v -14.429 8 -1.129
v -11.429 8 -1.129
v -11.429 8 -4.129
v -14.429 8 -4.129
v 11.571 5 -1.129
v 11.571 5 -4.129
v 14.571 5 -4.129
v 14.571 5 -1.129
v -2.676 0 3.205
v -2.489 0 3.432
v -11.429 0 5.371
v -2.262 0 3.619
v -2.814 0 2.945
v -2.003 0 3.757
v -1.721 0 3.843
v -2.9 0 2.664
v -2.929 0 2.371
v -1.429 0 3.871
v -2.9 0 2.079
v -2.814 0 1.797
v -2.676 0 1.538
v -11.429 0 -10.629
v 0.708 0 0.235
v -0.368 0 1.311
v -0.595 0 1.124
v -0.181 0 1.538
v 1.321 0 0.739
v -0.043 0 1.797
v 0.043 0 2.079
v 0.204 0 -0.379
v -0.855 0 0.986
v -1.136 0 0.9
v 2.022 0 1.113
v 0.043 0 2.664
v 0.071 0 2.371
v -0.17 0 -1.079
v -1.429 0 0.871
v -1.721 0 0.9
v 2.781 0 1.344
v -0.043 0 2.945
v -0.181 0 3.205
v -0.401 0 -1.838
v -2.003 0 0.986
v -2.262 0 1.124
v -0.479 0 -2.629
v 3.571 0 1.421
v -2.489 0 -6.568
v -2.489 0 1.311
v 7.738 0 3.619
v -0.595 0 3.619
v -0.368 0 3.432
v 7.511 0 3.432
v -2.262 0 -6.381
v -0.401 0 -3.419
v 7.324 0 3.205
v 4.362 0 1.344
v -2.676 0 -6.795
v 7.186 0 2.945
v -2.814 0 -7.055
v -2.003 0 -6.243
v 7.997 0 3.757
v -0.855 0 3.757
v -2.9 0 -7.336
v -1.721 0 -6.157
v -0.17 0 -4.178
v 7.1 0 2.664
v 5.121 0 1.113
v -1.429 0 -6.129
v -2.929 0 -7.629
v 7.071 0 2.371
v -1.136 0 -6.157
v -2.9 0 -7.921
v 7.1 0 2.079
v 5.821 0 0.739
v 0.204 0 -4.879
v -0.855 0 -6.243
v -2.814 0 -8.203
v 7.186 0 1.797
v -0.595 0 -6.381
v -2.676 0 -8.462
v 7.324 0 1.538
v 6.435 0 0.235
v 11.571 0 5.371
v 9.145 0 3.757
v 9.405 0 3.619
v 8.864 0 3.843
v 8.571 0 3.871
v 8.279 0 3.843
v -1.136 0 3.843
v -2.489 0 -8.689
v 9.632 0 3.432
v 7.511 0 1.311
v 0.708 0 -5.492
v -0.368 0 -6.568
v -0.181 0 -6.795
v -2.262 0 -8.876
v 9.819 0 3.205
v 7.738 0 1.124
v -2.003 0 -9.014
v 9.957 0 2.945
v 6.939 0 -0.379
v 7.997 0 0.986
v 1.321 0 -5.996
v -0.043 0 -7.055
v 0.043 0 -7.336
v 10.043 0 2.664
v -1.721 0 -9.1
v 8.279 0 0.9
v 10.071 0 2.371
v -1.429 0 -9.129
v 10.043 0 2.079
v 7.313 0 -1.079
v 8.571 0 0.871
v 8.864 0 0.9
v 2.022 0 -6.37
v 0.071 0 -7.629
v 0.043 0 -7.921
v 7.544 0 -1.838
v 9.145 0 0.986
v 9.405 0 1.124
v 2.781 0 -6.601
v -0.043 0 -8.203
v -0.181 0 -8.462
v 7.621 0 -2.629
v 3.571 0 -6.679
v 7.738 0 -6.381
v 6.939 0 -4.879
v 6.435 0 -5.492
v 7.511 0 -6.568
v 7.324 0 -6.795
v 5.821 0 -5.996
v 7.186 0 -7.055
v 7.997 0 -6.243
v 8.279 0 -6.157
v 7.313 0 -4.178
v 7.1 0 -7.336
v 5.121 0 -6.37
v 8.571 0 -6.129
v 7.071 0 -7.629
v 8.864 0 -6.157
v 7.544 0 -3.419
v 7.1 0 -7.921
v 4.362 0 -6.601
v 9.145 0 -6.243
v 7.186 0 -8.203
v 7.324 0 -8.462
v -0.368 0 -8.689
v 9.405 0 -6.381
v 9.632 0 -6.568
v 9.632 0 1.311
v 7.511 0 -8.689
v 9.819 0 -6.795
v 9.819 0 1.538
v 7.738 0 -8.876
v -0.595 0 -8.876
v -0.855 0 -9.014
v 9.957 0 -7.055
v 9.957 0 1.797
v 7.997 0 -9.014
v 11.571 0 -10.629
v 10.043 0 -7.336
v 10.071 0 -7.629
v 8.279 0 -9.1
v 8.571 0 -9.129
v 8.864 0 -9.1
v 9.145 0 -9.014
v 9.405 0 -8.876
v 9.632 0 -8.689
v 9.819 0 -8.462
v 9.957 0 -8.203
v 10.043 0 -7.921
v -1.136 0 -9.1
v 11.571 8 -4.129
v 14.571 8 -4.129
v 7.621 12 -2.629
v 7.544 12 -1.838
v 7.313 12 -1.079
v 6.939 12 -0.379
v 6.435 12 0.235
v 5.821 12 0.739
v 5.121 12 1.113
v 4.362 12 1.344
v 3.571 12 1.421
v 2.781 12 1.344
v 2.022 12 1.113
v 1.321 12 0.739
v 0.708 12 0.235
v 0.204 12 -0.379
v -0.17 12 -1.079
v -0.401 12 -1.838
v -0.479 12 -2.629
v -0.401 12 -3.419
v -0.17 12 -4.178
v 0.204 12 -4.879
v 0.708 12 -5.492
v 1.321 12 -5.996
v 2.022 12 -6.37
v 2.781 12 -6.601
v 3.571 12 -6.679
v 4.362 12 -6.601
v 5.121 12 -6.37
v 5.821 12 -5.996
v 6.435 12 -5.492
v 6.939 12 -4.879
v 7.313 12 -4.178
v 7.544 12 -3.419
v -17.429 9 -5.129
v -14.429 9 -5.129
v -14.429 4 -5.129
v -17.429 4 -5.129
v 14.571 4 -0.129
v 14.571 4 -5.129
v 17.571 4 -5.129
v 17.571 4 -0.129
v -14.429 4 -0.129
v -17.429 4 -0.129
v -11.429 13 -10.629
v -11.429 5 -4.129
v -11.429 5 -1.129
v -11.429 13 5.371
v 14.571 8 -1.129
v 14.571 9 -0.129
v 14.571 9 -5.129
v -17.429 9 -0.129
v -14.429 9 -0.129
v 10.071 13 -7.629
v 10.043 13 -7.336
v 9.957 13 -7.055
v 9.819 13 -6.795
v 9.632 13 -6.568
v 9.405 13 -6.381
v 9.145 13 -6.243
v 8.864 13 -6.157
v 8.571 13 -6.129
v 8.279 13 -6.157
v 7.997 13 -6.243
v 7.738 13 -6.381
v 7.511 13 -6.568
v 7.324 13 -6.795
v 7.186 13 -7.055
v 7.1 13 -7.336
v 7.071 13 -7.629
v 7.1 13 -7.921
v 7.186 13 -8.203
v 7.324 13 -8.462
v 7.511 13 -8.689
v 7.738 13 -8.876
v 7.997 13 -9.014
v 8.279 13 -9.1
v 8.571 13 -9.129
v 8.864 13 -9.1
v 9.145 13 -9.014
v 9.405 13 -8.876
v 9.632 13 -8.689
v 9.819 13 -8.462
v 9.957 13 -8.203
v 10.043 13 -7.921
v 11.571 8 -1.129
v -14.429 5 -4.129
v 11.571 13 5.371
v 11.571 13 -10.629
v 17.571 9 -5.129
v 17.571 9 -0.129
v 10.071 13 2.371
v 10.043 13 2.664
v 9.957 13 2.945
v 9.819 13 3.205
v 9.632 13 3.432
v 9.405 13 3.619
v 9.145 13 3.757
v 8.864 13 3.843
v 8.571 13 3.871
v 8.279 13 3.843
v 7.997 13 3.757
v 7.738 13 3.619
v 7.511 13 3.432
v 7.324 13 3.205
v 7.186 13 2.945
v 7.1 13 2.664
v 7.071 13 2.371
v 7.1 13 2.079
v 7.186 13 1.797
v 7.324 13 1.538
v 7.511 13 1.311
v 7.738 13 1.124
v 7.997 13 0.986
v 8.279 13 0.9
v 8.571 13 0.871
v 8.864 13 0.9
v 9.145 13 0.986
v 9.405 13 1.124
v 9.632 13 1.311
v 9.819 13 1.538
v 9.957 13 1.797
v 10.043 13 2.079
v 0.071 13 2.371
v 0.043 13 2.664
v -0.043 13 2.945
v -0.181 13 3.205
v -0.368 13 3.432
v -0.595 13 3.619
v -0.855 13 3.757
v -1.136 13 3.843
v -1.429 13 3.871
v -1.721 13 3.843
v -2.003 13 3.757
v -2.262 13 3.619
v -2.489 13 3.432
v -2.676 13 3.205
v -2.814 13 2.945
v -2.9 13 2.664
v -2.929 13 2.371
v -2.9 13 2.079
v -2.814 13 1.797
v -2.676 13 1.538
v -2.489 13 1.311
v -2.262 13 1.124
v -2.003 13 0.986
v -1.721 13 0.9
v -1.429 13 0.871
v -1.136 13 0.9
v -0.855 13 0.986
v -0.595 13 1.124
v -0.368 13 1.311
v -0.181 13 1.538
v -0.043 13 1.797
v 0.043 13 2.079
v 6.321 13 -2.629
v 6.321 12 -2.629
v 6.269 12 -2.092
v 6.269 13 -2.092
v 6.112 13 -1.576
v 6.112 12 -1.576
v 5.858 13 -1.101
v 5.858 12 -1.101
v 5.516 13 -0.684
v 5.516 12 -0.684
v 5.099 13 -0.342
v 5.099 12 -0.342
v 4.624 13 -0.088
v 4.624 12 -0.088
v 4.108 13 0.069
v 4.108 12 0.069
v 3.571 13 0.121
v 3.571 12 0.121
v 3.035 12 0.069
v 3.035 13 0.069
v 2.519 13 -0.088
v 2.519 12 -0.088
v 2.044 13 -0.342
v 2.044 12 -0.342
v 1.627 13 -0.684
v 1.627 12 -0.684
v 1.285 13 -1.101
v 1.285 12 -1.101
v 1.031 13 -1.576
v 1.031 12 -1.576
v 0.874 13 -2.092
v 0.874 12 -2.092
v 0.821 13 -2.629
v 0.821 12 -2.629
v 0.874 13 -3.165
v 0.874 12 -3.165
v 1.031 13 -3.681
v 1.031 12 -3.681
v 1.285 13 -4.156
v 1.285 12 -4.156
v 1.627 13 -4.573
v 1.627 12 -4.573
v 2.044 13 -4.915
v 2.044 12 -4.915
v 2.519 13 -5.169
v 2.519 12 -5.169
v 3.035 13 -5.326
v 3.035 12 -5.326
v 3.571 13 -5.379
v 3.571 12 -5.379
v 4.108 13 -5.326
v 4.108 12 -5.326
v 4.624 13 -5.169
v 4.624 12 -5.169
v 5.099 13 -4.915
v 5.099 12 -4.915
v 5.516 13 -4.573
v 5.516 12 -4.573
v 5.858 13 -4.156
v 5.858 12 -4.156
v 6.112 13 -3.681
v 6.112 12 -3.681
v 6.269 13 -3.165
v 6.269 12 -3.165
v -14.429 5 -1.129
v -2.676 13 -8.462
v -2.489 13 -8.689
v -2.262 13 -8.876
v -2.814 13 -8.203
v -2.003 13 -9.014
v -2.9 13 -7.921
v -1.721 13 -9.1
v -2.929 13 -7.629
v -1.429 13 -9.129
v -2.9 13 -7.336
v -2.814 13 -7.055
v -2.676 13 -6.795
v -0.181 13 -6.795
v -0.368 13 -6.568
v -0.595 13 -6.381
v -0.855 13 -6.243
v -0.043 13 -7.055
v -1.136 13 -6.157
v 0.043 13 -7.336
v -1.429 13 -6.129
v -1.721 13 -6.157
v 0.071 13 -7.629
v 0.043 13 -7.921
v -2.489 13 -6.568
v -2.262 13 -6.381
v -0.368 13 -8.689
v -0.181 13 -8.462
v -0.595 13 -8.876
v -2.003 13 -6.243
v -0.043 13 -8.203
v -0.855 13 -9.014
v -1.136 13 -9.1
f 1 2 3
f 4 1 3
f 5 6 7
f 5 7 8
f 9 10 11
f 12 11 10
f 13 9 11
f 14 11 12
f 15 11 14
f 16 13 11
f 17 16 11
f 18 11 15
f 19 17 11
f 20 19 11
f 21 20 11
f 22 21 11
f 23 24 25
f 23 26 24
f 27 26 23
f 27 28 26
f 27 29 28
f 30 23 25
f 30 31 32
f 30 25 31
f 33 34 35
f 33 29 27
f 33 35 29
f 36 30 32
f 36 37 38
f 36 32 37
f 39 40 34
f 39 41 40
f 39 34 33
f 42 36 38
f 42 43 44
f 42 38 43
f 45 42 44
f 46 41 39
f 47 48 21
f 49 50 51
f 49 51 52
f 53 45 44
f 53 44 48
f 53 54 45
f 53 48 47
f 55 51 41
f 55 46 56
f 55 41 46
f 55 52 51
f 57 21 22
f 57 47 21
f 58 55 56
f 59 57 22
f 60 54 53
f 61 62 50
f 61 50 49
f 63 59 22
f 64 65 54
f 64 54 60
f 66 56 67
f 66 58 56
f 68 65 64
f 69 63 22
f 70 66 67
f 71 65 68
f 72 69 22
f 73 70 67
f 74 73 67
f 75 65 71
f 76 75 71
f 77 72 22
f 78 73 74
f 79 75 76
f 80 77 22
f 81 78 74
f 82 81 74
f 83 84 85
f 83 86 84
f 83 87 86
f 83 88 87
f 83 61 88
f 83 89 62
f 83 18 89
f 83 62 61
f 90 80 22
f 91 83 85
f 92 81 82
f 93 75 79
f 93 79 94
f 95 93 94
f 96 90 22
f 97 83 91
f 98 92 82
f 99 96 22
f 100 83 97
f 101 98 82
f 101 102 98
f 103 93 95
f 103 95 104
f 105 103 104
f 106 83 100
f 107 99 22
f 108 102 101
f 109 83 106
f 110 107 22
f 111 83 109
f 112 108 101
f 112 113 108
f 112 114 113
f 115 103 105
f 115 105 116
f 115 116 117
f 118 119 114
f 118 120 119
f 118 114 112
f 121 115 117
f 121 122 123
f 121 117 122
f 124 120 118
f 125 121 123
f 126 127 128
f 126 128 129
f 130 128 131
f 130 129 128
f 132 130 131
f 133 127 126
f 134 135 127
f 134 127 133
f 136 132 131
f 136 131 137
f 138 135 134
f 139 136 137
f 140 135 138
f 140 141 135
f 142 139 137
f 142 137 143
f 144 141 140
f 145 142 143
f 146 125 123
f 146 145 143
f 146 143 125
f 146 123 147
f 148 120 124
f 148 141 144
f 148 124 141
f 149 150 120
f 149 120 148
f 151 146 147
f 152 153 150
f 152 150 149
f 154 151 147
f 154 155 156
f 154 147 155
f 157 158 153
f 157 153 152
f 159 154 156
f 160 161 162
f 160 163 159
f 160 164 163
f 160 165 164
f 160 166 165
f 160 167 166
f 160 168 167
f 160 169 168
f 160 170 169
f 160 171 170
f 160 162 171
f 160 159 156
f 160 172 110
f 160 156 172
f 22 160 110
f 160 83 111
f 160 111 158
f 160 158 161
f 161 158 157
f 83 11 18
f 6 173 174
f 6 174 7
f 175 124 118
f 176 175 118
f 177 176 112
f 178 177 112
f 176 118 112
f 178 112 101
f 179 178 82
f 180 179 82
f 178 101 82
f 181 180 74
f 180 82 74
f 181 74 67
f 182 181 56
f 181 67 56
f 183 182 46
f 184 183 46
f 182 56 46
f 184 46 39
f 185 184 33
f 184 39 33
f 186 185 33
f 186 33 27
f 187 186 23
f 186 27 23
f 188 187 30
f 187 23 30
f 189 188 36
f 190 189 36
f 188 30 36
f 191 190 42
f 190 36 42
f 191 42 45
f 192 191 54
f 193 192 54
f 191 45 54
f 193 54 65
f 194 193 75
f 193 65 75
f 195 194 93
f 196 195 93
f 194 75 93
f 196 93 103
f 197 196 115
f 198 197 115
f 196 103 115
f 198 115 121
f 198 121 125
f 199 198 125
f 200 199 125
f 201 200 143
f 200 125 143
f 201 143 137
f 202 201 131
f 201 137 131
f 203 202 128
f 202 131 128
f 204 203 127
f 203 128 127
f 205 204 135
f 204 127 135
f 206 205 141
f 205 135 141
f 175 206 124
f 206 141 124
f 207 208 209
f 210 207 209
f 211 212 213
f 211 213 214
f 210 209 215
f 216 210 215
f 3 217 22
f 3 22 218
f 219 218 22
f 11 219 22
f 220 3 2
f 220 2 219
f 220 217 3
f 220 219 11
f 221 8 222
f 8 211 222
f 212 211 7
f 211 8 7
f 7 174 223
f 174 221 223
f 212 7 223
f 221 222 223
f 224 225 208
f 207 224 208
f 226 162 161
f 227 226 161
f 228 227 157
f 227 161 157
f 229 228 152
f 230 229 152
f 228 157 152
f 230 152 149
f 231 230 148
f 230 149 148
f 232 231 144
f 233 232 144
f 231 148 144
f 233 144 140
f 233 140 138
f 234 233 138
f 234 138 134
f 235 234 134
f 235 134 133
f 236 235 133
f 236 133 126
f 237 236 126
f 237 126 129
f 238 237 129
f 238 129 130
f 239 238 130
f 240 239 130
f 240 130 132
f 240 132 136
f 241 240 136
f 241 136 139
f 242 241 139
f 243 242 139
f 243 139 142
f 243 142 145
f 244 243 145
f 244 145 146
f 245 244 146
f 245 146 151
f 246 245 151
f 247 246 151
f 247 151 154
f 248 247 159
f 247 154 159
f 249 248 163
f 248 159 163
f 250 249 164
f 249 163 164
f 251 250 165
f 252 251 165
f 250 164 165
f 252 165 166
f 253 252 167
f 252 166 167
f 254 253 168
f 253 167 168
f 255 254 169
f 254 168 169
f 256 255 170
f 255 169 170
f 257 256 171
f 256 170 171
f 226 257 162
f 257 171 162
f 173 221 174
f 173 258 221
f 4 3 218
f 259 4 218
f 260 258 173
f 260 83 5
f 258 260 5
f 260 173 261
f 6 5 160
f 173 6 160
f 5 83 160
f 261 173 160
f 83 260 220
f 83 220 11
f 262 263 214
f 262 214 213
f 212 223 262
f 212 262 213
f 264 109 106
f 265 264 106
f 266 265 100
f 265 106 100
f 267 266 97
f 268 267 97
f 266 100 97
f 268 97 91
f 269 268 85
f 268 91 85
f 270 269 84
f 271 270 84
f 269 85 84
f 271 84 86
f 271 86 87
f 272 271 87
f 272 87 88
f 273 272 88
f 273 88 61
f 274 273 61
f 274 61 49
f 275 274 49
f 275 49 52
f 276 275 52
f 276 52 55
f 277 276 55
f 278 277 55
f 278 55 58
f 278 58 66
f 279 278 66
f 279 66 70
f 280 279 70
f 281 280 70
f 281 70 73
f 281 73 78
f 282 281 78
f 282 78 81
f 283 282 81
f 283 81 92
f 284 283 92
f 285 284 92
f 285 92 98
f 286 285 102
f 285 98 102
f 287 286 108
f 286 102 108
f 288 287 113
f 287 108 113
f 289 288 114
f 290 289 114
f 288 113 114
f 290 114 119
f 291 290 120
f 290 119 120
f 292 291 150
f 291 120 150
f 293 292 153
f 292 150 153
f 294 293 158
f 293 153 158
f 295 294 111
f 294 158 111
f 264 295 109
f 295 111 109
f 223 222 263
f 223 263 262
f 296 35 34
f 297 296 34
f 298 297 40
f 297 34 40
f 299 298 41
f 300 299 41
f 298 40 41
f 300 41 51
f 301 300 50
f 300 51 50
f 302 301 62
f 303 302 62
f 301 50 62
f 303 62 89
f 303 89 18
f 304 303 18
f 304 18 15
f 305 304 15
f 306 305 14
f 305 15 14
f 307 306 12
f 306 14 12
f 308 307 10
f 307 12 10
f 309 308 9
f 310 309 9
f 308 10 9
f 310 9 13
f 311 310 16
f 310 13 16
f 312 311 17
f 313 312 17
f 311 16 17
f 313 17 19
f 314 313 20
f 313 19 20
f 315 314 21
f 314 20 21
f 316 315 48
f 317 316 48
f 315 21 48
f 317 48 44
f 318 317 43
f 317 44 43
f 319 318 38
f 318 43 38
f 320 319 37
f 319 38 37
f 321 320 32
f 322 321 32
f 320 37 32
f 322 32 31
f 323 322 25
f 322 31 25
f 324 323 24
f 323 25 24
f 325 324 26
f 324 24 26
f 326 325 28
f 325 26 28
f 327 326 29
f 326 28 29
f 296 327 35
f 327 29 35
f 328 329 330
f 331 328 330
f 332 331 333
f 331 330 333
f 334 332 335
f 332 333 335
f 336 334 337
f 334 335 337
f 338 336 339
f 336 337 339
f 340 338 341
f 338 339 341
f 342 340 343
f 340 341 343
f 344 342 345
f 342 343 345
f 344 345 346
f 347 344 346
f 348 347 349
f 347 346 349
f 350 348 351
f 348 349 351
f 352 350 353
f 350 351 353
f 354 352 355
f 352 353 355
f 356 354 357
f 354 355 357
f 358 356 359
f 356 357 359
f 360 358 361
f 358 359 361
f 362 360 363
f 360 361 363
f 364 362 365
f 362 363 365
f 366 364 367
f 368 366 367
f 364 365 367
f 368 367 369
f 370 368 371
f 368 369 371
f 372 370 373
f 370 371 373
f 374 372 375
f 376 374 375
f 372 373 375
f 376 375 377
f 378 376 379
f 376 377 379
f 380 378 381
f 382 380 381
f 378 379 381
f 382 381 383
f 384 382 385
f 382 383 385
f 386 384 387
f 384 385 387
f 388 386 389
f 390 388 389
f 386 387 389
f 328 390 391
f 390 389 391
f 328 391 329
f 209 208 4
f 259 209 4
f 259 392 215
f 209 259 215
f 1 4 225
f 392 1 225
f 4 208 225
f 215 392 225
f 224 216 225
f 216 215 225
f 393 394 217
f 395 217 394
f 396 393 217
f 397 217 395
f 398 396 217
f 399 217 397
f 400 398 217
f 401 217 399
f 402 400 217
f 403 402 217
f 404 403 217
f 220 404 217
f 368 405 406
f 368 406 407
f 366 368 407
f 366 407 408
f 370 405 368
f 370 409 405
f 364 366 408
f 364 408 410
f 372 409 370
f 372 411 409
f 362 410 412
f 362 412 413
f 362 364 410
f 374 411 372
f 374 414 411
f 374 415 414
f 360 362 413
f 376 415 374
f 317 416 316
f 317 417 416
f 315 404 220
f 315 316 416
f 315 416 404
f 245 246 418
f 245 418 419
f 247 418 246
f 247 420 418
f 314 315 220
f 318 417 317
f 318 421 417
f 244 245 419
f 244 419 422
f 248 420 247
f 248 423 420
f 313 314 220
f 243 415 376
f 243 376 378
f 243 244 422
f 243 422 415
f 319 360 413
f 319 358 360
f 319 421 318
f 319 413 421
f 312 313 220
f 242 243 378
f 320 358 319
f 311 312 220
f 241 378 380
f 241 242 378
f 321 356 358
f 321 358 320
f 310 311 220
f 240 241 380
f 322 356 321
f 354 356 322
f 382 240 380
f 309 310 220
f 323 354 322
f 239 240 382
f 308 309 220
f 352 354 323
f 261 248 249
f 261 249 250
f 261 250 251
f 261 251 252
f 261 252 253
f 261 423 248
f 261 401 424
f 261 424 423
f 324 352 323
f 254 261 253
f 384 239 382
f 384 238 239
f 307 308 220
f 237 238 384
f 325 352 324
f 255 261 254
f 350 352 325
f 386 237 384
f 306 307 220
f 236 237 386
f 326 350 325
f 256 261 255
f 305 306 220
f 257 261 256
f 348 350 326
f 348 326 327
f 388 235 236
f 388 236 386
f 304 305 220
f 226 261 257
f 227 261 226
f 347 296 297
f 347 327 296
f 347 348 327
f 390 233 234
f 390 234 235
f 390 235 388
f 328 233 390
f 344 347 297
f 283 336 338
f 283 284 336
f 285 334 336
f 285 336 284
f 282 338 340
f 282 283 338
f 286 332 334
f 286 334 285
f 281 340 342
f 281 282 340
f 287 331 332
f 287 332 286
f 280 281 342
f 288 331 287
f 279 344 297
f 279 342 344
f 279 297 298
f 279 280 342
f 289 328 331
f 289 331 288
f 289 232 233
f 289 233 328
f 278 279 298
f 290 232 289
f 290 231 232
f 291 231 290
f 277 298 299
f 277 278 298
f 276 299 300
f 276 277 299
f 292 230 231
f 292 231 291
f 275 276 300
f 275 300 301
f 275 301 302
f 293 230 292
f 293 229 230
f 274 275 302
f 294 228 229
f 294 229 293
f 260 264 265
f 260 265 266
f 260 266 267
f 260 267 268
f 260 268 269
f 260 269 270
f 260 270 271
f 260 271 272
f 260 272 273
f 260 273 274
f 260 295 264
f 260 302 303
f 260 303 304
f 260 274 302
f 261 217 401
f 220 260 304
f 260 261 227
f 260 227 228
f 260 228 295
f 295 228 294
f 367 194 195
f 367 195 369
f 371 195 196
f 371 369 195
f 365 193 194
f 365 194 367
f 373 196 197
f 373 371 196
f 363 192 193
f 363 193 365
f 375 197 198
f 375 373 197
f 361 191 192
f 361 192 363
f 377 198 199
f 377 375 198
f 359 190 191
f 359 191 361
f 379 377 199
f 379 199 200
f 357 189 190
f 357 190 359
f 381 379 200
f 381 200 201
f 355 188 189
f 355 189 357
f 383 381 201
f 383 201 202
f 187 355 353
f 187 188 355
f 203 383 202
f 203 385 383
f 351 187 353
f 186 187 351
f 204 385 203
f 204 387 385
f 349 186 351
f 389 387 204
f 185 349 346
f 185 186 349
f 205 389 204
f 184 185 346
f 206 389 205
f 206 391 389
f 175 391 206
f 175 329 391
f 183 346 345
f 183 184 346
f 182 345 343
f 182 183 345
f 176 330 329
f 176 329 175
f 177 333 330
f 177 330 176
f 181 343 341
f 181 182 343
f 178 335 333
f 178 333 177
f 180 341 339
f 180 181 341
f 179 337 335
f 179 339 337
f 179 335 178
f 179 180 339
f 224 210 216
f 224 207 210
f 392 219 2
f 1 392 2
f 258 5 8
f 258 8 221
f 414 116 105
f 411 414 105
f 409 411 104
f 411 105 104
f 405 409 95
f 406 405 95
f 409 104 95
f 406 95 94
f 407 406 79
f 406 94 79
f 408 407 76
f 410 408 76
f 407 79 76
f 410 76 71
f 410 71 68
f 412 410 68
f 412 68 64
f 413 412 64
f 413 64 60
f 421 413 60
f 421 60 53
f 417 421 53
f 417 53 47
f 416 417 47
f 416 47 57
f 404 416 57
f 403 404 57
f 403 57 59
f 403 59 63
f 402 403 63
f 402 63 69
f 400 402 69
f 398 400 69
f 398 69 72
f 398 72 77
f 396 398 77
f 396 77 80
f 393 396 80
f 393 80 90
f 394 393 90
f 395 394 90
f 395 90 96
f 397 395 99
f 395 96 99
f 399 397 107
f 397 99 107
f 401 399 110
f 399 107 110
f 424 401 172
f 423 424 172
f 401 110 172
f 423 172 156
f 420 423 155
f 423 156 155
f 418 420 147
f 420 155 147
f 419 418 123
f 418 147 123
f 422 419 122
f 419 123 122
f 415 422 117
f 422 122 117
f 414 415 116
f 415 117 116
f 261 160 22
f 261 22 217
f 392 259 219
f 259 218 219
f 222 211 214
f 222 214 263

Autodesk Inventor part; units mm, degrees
ref_plane "YZ Plane" through (0, 0, 0) normal (1, 0, 0) x (0, 1, 0)
ref_plane "XZ Plane" through (0, 0, 0) normal (0, 1, 0) x (-1, 0, 0)
ref_plane "XY Plane" through (0, 0, 0) normal (0, 0, 1) x (1, 0, 0)
sketch "Esquisse1" plane through (0, 0, 0) normal (0, 1, 0) x (-1, 0, 0)
  line L0 (4.4286, 5.3714) -> (-11.5714, 5.3714)
  line L1 (-11.5714, 5.3714) -> (-11.5714, -10.6286)
  line L2 (-11.5714, -10.6286) -> (4.4286, -10.6286)
  line L3 (4.4286, -10.6286) -> (4.4286, 5.3714)
  point P0 (0, 0)
  dimension "d0" = 16
  dimension "d1" = 16
extrude "Extrusion1" add sketch "Esquisse1" along normal blind 13
sketch "Esquisse2" plane through (0, 0, 0) normal (0, -1, 0) x (1, 0, 0)
  circle A0 centre (3.5714, -2.6286) radius 4.05
  line L0 (-4.4286, 5.3714) -> (11.5714, 5.3714) projected
  line L1 (11.5714, 5.3714) -> (11.5714, -10.6286) projected
  point P0 (0, 0)
  dimension "d4" = 8
  dimension "d5" = 8
  dimension "d6" = 8.1
extrude "Extrusion2" cut sketch "Esquisse2" against normal blind 12
sketch "Esquisse3" plane through (3.5714, 12, -2.6286) normal (0, -1, 0) x (1, 0, 0)
  circle A0 centre (0, 0) radius 2.75
  line L0 (8, -8) -> (-8, -8) projected
  line L1 (8, 8) -> (8, -8) projected
  point P0 (-3.5714, 2.6286)
  dimension "d9" = 5.5
  dimension "d10" = 8
  dimension "d11" = 8
extrude "Extrusion3" cut sketch "Esquisse3" against normal through all
sketch "Esquisse4" plane through (0, 0, 0) normal (0, -1, 0) x (1, 0, 0)
  circle A0 centre (8.5714, 2.3714) radius 1.5
  circle A1 centre (-1.4286, 2.3714) radius 1.5
  circle A2 centre (-1.4286, -7.6286) radius 1.5
  circle A3 centre (8.5714, -7.6286) radius 1.5
  line L0 (-4.4286, -10.6286) -> (-4.4286, 5.3714) projected
  line L1 (-4.4286, 5.3714) -> (11.5714, 5.3714) projected
  line L2 (11.5714, 5.3714) -> (11.5714, -10.6286) projected
  line L3 (11.5714, -10.6286) -> (-4.4286, -10.6286) projected
  point P0 (0, 0)
  dimension "d14" = 3
  dimension "d15" = 3
  dimension "d16" = 3
  dimension "d17" = 3
  dimension "d19" = 3
  dimension "d20" = 3
  dimension "d21" = 3
  dimension "d22" = 3
  dimension "d23" = 3
  dimension "d24" = 3
  dimension "d25" = 3
  dimension "d26" = 3
extrude "Extrusion4" cut sketch "Esquisse4" against normal through all contours A0 | A1 | A2 | A3
sketch "Esquisse6" plane through (11.5714, 0, 5.3714) normal (1, 0, 0) x (0, 0, -1)
  line L0 (6.5, 8) -> (9.5, 8)
  line L1 (9.5, 8) -> (9.5, 5)
  line L2 (9.5, 5) -> (6.5, 5)
  line L3 (6.5, 5) -> (6.5, 8)
  line L4 (0, 0) -> (0, 13) projected
  line L5 (0, 13) -> (16, 13) projected
  point P0 (5.3714, 0)
  dimension "d29" = 3
  dimension "d30" = 3
  dimension "d31" = 6.5
  dimension "d32" = 5
extrude "Extrusion5" add sketch "Esquisse6" along normal blind 3
sketch "Esquisse7" plane through (14.5714, 0, 5.3714) normal (1, 0, 0) x (0, 0, -1)
  line L0 (5.5, 9) -> (10.5, 9)
  line L1 (10.5, 9) -> (10.5, 4)
  line L2 (10.5, 4) -> (5.5, 4)
  line L3 (5.5, 4) -> (5.5, 9)
  line L4 (0, 13) -> (16, 13) projected
  line L5 (0, 0) -> (0, 13) projected
  point P0 (5.3714, 0)
  dimension "d35" = 5
  dimension "d36" = 5
  dimension "d37" = 4
  dimension "d38" = 5.5
extrude "Extrusion6" add sketch "Esquisse7" along normal blind 3
sketch "Esquisse8" plane through (-4.4286, 0, -10.6286) normal (-1, 0, 0) x (0, 0, 1)
  line L0 (0, 0) -> (0, 13) projected
  line L1 (0, 13) -> (16, 13)
  line L2 (16, 13) -> (16, 0)
  line L3 (16, 0) -> (0, 0)
  line L4 (0, 0) -> (0, 13)
  point P0 (10.6286, 0)
extrude "Extrusion7" add sketch "Esquisse8" along normal blind 7
sketch "Esquisse9" plane through (-11.4286, 0, -10.6286) normal (-1, 0, 0) x (0, 0, 1)
  line L0 (9.5, 8) -> (6.5, 8)
  line L1 (6.5, 8) -> (6.5, 5)
  line L2 (6.5, 5) -> (9.5, 5)
  line L3 (9.5, 5) -> (9.5, 8)
  line L4 (16, 0) -> (16, 13) projected
  line L5 (16, 13) -> (0, 13) projected
  point P0 (10.6286, 0)
  dimension "d43" = 6.5
  dimension "d44" = 5
  dimension "d45" = 3
  dimension "d46" = 3
extrude "Extrusion8" add sketch "Esquisse9" along normal blind 3
sketch "Esquisse10" plane through (-14.4286, 0, -10.6286) normal (-1, 0, 0) x (0, 0, 1)
  line L0 (10.5, 9) -> (5.5, 9)
  line L1 (5.5, 9) -> (5.5, 4)
  line L2 (5.5, 4) -> (10.5, 4)
  line L3 (10.5, 4) -> (10.5, 9)
  line L4 (16, 0) -> (16, 13) projected
  line L5 (0, 0) -> (16, 0) projected
  point P0 (10.6286, 0)
  dimension "d49" = 5.5
  dimension "d50" = 4
  dimension "d51" = 5
  dimension "d52" = 5
extrude "Extrusion9" add sketch "Esquisse10" along normal blind 3
properties part number "capuchon_roulement_8_1mm"
